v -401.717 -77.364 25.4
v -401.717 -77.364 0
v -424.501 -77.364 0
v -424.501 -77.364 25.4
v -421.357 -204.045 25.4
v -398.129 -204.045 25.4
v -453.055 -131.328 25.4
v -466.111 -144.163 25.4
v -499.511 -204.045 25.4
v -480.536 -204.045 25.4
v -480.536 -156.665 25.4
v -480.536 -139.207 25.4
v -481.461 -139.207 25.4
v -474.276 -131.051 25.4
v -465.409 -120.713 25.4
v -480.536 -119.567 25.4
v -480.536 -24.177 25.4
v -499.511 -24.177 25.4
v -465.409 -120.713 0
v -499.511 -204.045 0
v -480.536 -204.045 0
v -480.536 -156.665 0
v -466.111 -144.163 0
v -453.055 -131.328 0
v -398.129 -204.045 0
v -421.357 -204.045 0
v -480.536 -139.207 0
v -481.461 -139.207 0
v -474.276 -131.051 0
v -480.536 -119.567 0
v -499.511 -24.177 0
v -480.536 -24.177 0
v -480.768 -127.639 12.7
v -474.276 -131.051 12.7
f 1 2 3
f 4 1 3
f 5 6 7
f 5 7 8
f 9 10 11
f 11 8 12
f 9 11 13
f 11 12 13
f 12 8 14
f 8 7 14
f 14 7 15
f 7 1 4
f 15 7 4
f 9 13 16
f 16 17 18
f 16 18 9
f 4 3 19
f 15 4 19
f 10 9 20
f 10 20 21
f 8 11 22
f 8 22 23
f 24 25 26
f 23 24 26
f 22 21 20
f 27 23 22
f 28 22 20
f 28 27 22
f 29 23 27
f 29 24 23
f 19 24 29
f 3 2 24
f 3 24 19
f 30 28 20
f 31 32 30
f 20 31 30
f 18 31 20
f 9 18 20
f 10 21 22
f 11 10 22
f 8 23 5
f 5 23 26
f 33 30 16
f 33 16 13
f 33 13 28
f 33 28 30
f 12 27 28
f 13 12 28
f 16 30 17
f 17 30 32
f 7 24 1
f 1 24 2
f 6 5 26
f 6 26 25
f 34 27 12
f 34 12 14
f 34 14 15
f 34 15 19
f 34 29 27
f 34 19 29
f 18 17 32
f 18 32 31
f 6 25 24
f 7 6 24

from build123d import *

# Parameters (mm, degrees)
F1_DEPTH = 25.4


with BuildPart() as f1:
    # F0 (on Top) → F1 (new body)
    with BuildSketch(Plane.XY):
        with BuildLine():
            add(Edge.make_bspline(
                [(-480.5364153451, -139.2066991603), (-475.5801438199, -132.1421628818), (-465.4086910628, -120.7131486929)],
                knots=[0, 0, 0, 1, 1, 1], degree=2))
            Line((-480.5364153451, -139.2066991603), (-481.4610928685, -139.2066991603))
            add(Edge.make_bspline(
                [(-480.5364153451, -119.566548564), (-480.5364153451, -125.8913428238), (-481.4610928685, -139.2066991603)],
                knots=[0, 0, 0, 1, 1, 1], degree=2))
            Line((-480.5364153451, -119.566548564), (-480.5364153451, -24.1768152531))
            Line((-480.5364153451, -24.1768152531), (-499.5107981247, -24.1768152531))
            Line((-499.5107981247, -24.1768152531), (-499.5107981247, -204.0450870991))
            Line((-499.5107981247, -204.0450870991), (-480.5364153451, -204.0450870991))
            Line((-480.5364153451, -204.0450870991), (-480.5364153451, -156.6646108016))
            Line((-480.5364153451, -156.6646108016), (-466.1114459806, -144.1629706856))
            Line((-466.1114459806, -144.1629706856), (-421.3570538494, -204.0450870991))
            Line((-421.3570538494, -204.0450870991), (-398.1291544624, -204.0450870991))
            Line((-398.1291544624, -204.0450870991), (-453.0549993506, -131.3284466612))
            Line((-453.0549993506, -131.3284466612), (-401.716903253, -77.3642663973))
            Line((-401.716903253, -77.3642663973), (-424.5009574289, -77.3642663973))
            Line((-424.5009574289, -77.3642663973), (-465.4086910628, -120.7131486929))
        make_face()
    extrude(amount=F1_DEPTH)


solid = f1.part
